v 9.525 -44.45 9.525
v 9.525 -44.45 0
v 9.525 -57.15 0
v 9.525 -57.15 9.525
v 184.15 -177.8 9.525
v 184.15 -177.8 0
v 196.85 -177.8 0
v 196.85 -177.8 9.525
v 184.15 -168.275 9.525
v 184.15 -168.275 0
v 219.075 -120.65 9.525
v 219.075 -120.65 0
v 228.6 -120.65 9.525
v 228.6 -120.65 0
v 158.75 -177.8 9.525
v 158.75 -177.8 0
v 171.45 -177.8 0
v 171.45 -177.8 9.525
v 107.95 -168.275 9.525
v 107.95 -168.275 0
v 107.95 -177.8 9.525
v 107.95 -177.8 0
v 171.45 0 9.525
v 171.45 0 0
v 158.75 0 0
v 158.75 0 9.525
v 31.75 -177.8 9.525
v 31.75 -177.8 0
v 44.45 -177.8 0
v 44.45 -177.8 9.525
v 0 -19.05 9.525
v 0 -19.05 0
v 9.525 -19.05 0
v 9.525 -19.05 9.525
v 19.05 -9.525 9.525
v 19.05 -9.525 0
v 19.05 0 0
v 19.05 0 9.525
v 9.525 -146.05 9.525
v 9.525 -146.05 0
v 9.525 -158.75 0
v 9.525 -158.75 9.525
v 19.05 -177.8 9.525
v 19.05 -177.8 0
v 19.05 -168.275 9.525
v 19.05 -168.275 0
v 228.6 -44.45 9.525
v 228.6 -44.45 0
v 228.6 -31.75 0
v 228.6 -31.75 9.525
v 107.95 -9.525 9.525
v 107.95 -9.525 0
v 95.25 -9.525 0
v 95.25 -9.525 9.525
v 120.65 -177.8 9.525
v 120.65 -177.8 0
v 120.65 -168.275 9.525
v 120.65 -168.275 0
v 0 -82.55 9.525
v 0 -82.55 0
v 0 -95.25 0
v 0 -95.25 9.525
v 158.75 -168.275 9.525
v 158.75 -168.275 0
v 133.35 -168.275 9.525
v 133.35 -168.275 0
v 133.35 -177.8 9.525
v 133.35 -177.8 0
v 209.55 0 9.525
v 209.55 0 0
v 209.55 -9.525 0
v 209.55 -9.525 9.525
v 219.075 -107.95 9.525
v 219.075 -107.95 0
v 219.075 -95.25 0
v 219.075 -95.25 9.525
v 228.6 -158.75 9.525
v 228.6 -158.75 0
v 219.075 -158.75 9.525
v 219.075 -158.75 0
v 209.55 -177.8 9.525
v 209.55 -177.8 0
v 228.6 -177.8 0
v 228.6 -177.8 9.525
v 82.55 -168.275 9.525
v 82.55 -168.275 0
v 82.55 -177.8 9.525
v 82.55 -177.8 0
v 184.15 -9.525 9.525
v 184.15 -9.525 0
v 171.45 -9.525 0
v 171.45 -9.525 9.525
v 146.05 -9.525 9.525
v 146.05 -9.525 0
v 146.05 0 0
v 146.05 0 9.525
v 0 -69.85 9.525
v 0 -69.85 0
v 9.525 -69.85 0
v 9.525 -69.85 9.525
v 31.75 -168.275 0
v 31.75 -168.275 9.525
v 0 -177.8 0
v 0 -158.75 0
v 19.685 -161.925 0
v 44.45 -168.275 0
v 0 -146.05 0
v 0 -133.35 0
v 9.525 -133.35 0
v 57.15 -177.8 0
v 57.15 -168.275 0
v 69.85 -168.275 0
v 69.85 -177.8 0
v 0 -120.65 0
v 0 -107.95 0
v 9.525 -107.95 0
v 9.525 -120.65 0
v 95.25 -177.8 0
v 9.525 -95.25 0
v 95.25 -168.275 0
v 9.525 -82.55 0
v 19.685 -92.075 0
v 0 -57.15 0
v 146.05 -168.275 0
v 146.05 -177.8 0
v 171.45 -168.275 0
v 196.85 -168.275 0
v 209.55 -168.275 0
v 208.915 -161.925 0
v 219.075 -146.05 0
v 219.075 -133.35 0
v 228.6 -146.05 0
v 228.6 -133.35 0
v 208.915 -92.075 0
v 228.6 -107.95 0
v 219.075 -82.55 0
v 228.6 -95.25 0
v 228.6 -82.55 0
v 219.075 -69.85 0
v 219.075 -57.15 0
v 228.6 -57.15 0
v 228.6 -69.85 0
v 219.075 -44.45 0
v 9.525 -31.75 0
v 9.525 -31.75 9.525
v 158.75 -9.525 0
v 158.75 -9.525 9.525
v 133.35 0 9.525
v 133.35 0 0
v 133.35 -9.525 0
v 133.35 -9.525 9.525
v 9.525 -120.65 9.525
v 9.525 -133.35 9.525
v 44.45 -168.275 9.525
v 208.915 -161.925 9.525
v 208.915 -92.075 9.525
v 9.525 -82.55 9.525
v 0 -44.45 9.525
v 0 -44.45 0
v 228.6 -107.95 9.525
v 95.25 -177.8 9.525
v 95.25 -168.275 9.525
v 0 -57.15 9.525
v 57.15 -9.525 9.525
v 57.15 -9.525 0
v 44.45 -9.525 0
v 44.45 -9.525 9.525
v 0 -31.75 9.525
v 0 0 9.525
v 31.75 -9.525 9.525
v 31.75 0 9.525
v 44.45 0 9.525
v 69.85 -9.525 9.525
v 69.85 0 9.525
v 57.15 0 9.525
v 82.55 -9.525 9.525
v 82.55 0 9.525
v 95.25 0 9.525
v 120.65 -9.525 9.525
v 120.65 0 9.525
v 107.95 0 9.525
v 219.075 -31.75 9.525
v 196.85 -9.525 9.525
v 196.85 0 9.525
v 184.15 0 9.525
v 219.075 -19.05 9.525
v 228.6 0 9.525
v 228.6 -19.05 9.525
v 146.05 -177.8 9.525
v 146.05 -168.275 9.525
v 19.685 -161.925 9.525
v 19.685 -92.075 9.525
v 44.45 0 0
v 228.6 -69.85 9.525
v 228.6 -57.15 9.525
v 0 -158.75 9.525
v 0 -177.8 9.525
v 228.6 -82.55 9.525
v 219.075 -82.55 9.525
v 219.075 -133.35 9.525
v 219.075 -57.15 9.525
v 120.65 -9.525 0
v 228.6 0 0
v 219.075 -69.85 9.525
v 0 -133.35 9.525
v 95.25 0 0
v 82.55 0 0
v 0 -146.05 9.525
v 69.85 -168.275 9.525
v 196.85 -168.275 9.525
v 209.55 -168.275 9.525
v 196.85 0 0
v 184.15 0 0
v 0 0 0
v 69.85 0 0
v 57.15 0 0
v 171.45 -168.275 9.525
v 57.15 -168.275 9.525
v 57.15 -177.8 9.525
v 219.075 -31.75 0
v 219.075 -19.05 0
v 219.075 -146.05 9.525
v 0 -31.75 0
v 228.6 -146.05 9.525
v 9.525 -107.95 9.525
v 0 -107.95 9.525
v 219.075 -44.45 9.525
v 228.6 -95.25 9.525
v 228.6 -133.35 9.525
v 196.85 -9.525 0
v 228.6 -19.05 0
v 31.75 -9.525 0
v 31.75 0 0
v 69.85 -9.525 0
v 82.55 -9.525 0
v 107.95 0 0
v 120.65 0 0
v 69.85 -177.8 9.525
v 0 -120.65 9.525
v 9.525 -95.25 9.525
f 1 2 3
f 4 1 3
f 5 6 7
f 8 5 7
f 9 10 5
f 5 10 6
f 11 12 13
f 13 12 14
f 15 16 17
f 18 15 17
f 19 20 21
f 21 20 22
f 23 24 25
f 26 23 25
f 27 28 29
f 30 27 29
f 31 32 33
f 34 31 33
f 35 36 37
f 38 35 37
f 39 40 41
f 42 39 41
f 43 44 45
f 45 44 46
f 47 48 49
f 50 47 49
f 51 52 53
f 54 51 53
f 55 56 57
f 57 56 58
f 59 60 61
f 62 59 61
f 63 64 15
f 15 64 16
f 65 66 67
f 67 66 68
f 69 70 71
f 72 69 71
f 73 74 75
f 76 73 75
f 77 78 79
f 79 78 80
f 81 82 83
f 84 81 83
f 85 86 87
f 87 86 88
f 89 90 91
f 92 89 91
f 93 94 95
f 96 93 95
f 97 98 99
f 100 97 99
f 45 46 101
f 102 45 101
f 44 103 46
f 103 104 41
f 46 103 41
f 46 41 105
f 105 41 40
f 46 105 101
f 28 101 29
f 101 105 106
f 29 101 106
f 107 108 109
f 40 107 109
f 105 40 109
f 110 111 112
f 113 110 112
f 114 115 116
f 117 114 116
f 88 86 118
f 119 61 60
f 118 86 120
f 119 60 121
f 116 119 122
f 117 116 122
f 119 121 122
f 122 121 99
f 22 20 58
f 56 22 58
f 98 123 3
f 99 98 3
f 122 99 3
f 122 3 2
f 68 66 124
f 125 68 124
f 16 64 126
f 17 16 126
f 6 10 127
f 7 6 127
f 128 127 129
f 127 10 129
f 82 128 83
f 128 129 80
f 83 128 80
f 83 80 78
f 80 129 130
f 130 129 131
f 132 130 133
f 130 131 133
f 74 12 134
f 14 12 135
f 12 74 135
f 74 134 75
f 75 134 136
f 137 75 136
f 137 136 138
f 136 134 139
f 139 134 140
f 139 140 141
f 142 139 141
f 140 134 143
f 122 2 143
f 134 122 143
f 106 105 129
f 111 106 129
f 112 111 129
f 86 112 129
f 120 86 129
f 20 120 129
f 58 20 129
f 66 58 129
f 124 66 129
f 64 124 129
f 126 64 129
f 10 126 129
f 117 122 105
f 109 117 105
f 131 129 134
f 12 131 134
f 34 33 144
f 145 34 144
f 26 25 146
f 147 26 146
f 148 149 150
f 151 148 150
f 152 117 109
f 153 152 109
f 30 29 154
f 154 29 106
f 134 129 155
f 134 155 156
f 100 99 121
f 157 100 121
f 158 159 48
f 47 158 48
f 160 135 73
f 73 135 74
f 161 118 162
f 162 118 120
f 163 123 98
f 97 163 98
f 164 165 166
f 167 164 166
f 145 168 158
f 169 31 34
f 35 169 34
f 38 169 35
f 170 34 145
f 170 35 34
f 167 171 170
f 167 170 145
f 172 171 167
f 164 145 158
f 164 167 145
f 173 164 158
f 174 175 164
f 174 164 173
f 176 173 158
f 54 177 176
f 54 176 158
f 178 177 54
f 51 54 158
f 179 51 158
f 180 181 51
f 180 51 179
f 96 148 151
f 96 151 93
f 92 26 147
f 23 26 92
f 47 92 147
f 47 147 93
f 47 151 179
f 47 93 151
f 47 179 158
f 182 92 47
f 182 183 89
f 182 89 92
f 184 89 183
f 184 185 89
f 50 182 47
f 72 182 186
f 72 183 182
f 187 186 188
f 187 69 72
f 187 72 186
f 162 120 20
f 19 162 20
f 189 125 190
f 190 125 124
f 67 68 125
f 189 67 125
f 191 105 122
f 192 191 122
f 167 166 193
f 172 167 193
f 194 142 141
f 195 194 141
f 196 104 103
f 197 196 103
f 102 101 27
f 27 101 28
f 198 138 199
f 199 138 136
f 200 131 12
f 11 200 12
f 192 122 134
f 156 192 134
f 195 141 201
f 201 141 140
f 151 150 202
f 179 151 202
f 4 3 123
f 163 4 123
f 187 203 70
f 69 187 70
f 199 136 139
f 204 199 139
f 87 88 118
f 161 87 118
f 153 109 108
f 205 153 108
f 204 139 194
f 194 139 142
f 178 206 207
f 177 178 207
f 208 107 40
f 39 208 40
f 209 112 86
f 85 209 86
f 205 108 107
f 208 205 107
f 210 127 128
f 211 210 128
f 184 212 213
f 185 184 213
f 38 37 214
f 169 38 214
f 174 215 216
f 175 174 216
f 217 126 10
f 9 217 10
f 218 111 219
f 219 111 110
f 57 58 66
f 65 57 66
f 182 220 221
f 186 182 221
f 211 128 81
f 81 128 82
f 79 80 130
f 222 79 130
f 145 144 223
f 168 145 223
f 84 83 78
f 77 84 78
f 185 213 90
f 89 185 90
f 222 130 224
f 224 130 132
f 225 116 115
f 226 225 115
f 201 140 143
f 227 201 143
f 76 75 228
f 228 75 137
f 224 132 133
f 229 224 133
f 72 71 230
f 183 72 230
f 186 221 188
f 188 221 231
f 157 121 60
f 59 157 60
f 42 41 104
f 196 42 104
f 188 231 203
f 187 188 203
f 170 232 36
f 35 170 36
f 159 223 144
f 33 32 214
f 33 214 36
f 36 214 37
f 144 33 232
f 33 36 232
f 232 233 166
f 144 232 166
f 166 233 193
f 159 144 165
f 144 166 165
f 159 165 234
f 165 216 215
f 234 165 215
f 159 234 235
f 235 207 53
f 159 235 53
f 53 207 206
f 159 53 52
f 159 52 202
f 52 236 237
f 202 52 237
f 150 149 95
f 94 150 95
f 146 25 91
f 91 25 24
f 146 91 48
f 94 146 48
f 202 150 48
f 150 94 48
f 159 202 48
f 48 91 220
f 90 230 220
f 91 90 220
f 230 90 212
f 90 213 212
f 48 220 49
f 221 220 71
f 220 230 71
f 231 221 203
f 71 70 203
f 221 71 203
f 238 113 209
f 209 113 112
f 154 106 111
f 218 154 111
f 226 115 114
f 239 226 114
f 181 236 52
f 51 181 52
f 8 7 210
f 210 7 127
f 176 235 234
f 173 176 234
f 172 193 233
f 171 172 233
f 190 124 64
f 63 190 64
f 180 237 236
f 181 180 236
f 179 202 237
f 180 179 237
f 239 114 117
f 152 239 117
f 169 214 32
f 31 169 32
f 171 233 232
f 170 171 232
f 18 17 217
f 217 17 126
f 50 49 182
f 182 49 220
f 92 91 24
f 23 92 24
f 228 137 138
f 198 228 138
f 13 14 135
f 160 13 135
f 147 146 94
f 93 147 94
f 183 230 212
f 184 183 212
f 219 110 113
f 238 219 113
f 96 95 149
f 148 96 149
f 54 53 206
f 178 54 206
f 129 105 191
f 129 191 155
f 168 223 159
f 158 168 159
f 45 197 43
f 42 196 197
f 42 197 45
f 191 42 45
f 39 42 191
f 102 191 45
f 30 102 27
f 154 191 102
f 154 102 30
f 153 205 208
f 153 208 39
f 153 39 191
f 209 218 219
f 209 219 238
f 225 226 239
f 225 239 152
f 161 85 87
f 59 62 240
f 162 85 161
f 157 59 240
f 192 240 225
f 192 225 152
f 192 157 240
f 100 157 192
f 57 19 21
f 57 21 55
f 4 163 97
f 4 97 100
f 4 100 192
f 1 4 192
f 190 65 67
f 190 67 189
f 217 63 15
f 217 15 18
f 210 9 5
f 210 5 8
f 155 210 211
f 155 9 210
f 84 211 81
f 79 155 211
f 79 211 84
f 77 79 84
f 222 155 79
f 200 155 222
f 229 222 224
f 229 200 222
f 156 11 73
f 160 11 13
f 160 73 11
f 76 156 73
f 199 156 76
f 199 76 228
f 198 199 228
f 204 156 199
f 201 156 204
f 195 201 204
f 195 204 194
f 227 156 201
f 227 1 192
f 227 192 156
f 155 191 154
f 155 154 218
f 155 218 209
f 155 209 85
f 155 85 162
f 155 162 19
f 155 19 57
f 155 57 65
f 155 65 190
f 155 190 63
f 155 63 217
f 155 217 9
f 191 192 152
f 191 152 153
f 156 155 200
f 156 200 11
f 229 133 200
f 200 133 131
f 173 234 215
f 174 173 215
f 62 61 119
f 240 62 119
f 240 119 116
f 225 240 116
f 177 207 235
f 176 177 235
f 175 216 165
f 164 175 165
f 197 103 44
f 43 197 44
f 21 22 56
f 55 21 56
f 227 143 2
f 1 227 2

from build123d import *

# Parameters (mm, degrees)
F1_DEPTH = 9.525
F0_W     = 189.23
F0_H     = 69.85
F2_DEPTH = 9.525


with BuildPart() as f1:
    # F0 (on Top) → F1 (new body)
    with BuildSketch(Plane.XY):
        Polygon((19.05, 0), (0, 0), (0, -19.05), (9.525, -19.05), (9.525, -31.75), (0, -31.75), (0, -44.45), (9.525, -44.45), (219.075, -44.45), (228.6, -44.45), (228.6, -31.75), (219.075, -31.75), (219.075, -19.05), (228.6, -19.05), (228.6, 0), (209.55, 0), (209.55, -9.525), (196.85, -9.525), (196.85, 0), (184.15, 0), (184.15, -9.525), (171.45, -9.525), (171.45, 0), (158.75, 0), (158.75, -9.525), (146.05, -9.525), (146.05, 0), (133.35, 0), (133.35, -9.525), (120.65, -9.525), (120.65, 0), (107.95, 0), (107.95, -9.525), (95.25, -9.525), (95.25, 0), (82.55, 0), (82.55, -9.525), (69.85, -9.525), (69.85, 0), (57.15, 0), (57.15, -9.525), (44.45, -9.525), (44.45, 0), (31.75, 0), (31.75, -9.525), (19.05, -9.525), align=None)
    extrude(amount=F1_DEPTH)


with BuildPart() as f2:
    # F0 (on Top) → F2 (new body)
    with BuildSketch(Plane.XY):
        Polygon((219.075, -44.45), (9.525, -44.45), (9.525, -57.15), (0, -57.15), (0, -69.85), (9.525, -69.85), (9.525, -82.55), (0, -82.55), (0, -95.25), (9.525, -95.25), (9.525, -107.95), (0, -107.95), (0, -120.65), (9.525, -120.65), (9.525, -133.35), (0, -133.35), (0, -146.05), (9.525, -146.05), (9.525, -158.75), (0, -158.75), (0, -177.8), (19.05, -177.8), (19.05, -168.275), (31.75, -168.275), (31.75, -177.8), (44.45, -177.8), (44.45, -168.275), (57.15, -168.275), (57.15, -177.8), (69.85, -177.8), (69.85, -168.275), (82.55, -168.275), (82.55, -177.8), (95.25, -177.8), (95.25, -168.275), (107.95, -168.275), (107.95, -177.8), (120.65, -177.8), (120.65, -168.275), (133.35, -168.275), (133.35, -177.8), (146.05, -177.8), (146.05, -168.275), (158.75, -168.275), (158.75, -177.8), (171.45, -177.8), (171.45, -168.275), (184.15, -168.275), (184.15, -177.8), (196.85, -177.8), (196.85, -168.275), (209.55, -168.275), (209.55, -177.8), (228.6, -177.8), (228.6, -158.75), (219.075, -158.75), (219.075, -146.05), (228.6, -146.05), (228.6, -133.35), (219.075, -133.35), (219.075, -120.65), (228.6, -120.65), (228.6, -107.95), (219.075, -107.95), (219.075, -95.25), (228.6, -95.25), (228.6, -82.55), (219.075, -82.55), (219.075, -69.85), (228.6, -69.85), (228.6, -57.15), (219.075, -57.15), align=None)
        with Locations((114.3, -127)):
            Rectangle(F0_W, F0_H, mode=Mode.SUBTRACT)
    extrude(amount=F2_DEPTH)


solid = Compound([f1.part, f2.part])
